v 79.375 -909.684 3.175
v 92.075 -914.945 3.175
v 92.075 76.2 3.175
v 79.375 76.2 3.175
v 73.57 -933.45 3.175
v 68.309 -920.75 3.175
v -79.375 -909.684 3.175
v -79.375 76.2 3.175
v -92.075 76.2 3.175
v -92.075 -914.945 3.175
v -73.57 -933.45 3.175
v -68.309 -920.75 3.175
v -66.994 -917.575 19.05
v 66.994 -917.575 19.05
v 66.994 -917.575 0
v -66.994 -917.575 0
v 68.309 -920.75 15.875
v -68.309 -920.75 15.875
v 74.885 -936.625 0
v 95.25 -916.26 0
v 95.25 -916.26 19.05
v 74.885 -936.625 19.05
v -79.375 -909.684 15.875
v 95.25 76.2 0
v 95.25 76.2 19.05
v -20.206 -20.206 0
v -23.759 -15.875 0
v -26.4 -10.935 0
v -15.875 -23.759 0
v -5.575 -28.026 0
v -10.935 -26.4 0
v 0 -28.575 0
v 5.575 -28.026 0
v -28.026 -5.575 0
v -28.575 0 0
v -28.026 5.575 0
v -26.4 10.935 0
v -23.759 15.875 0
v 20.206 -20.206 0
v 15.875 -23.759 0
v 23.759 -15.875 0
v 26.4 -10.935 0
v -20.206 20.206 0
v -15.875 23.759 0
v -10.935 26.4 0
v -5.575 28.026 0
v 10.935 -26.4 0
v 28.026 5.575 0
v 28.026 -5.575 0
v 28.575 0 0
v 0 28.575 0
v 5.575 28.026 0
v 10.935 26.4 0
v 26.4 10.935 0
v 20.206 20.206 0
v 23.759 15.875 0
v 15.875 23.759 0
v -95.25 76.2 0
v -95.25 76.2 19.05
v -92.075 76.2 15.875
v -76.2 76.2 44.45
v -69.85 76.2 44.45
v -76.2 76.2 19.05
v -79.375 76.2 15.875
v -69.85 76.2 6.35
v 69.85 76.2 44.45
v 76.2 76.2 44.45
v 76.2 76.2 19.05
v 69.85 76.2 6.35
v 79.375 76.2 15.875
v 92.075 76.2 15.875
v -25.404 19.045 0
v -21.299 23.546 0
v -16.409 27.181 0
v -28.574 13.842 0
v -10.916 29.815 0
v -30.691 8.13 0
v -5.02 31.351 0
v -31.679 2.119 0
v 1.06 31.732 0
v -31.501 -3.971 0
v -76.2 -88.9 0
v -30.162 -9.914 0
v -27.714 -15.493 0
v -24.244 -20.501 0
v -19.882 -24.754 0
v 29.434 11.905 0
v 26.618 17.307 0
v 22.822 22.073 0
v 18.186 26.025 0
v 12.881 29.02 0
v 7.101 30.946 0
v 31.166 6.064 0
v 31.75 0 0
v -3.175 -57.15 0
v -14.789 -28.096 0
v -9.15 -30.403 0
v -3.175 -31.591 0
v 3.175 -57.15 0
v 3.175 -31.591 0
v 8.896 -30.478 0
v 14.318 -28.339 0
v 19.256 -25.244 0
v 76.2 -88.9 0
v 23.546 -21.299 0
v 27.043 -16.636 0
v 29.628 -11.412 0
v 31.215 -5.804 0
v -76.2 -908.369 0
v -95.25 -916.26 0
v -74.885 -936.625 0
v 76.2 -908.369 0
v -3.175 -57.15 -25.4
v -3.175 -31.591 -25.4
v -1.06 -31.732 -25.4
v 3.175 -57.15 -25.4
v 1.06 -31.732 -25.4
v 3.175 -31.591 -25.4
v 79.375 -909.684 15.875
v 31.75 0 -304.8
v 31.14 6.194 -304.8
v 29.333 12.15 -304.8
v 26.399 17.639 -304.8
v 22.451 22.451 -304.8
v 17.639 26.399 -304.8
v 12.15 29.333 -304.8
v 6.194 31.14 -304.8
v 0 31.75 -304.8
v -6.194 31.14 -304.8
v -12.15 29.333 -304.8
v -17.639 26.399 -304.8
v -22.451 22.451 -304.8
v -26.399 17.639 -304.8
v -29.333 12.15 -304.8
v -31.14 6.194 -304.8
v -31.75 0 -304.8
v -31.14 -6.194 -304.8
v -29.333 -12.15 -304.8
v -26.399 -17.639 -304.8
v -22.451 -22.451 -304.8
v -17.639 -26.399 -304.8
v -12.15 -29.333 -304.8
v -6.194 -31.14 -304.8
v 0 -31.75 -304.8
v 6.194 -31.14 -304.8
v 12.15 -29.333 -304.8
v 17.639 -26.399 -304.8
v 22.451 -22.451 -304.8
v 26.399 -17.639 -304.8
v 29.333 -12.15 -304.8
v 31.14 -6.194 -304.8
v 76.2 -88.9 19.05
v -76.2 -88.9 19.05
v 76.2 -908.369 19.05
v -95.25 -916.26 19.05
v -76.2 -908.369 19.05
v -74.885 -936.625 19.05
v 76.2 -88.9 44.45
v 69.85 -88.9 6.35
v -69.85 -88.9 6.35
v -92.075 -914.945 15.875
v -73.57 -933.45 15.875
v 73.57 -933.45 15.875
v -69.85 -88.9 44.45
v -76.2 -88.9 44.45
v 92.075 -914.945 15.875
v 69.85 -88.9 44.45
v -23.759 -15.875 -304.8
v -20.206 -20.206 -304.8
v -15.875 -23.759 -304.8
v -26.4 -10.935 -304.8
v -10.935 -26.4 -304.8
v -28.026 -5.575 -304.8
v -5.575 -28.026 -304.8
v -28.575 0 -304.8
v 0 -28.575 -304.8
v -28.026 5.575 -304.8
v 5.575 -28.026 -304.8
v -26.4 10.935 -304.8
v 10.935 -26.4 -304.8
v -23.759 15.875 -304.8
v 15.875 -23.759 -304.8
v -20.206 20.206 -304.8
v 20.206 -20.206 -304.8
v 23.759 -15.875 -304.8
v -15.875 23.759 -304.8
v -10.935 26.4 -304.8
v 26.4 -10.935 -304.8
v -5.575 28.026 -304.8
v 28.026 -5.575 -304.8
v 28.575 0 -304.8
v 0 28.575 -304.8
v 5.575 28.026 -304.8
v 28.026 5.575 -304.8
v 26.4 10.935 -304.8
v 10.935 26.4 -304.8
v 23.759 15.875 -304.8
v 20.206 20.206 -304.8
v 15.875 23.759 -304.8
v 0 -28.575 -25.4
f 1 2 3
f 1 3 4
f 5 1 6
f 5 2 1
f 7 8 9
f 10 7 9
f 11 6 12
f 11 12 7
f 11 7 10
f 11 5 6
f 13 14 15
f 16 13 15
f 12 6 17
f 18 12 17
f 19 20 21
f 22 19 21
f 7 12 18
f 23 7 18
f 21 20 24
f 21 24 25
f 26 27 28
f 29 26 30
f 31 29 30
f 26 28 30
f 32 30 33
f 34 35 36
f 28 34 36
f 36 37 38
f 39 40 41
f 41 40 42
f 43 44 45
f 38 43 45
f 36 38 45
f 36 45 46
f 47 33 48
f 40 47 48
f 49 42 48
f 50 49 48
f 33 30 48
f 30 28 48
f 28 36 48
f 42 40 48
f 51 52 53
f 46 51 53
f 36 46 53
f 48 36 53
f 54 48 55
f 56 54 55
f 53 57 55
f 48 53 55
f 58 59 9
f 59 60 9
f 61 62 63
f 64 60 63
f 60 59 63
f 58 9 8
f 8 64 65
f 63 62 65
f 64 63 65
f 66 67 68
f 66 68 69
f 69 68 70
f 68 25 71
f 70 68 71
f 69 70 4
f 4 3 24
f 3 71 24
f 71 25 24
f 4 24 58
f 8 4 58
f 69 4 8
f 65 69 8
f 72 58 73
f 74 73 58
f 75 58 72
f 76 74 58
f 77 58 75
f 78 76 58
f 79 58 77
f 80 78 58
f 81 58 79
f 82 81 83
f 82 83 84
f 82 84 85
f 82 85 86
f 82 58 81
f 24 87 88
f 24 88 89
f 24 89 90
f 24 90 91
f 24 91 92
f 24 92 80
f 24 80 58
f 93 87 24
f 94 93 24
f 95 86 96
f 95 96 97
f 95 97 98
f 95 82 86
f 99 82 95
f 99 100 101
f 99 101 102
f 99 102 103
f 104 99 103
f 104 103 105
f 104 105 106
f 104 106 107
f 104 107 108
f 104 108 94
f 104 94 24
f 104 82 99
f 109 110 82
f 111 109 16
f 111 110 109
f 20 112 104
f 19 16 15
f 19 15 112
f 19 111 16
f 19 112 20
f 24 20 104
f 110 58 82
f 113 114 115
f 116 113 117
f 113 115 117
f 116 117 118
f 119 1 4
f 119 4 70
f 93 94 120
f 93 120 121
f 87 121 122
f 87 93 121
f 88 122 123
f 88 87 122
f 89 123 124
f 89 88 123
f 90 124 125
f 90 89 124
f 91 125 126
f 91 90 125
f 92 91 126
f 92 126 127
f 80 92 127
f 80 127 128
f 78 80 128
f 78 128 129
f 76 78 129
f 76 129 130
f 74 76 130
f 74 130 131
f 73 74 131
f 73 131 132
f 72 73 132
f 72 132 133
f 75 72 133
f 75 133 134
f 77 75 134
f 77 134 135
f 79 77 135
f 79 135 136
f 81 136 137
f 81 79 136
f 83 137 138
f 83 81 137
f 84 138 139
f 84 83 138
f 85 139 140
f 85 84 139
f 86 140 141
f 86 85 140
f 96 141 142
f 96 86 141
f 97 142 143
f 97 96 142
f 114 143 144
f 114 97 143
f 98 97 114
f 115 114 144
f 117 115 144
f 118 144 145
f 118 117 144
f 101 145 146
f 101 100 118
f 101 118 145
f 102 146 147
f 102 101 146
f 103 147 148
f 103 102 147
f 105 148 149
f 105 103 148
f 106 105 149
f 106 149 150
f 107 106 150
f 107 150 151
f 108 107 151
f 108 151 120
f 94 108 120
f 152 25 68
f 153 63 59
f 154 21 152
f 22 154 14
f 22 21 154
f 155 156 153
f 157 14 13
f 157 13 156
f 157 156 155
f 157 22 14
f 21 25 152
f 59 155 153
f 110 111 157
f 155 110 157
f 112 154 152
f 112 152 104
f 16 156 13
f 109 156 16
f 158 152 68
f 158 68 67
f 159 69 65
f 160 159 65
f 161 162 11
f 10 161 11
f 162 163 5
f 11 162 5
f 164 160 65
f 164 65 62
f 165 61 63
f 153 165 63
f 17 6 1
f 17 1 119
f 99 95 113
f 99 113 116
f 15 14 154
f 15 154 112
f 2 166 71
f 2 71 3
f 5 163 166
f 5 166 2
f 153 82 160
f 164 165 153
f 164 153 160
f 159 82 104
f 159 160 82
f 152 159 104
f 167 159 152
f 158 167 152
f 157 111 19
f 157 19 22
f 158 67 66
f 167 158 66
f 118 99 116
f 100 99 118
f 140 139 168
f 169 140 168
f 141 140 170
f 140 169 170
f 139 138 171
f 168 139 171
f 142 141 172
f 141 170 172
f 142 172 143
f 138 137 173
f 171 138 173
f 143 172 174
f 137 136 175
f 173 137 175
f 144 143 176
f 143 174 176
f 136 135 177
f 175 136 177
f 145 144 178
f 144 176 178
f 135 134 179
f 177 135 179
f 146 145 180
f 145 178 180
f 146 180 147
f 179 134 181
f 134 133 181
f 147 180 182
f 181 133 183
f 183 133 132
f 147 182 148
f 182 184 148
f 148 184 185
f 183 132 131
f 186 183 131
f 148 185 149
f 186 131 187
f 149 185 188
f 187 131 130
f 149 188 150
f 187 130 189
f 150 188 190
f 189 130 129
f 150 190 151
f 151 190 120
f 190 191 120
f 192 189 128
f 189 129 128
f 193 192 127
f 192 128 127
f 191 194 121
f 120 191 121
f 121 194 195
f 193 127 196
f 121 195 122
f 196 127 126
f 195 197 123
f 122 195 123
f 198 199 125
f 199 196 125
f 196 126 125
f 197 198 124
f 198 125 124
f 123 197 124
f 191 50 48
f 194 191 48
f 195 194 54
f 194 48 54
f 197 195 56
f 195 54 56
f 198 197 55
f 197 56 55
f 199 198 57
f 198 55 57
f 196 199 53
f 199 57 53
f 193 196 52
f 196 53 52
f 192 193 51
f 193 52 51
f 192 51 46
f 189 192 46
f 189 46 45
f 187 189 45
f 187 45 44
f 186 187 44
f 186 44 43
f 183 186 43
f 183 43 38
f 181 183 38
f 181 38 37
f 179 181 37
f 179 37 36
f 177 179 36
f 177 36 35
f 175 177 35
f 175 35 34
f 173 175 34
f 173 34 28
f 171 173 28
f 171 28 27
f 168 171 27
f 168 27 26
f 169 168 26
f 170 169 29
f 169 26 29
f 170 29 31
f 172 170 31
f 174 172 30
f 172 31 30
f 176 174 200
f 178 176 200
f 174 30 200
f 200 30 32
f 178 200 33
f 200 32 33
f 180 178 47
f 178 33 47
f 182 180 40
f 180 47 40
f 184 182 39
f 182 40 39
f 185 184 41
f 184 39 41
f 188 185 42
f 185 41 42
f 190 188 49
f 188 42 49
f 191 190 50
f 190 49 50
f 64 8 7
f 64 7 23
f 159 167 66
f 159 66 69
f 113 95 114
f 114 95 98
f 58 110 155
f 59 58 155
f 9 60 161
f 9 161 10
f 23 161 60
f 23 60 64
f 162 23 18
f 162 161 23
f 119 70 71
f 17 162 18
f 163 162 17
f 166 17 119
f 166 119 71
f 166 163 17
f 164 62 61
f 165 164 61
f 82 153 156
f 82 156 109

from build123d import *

# Parameters (mm, degrees)
F0_R     = 31.75
F0_R_2   = 28.575
F1_DEPTH = 304.8
F2_W     = 6.35
F2_H     = 28.575
F3_DEPTH = 25.4
F6_DEPTH = 165.1
F7_W     = 19.05
F7_H     = 19.05
F7_W_2   = 12.7
F7_H_2   = 12.7


# Not quite as in the source:
# - a feature names something its author has since deleted; it is built from what else it names


with BuildPart() as f1:
    # F0 (on Top) → F1 (new body)
    with BuildSketch(Plane.XY):
        Circle(F0_R)
        Circle(F0_R_2, mode=Mode.SUBTRACT)
    extrude(amount=-F1_DEPTH)

    # F2 (on Top) → F3 (join)
    with BuildSketch(Plane.XY):
        with Locations((0, -42.8625)):
            Rectangle(F2_W, F2_H)
    extrude(amount=-F3_DEPTH)

    # F5 (on offset) → F6 (join)
    with BuildSketch(Plane.XZ.offset(-76.2)):
        Polygon((-76.2, 0), (76.2, 0), (76.2, 44.45), (69.85, 44.45), (69.85, 6.35), (-69.85, 6.35), (-69.85, 44.45), (-76.2, 44.45), align=None)
    extrude(amount=F6_DEPTH)

    # F9: sweep along a path in F8
    with BuildLine(Plane.XY.offset(6.35)) as f9_path:
        Line((98.425, 76.2), (98.425, -917.575))
        Line((98.425, -917.575), (76.2, -939.8))
        Line((76.2, -939.8), (-76.2, -939.8))
        Line((-76.2, -939.8), (-98.425, -917.575))
        Line((-98.425, -917.575), (-98.425, 76.2))
    # F7 (on offset) → F9 (sweep)
    with BuildSketch(Plane.XZ.offset(-76.2)):
        with Locations((85.725, 9.525)):
            Rectangle(F7_W, F7_H)
        with Locations((85.725, 9.525)):
            Rectangle(F7_W_2, F7_H_2, mode=Mode.SUBTRACT)
    sweep(path=f9_path.line, transition=Transition.RIGHT)


solid = f1.part
